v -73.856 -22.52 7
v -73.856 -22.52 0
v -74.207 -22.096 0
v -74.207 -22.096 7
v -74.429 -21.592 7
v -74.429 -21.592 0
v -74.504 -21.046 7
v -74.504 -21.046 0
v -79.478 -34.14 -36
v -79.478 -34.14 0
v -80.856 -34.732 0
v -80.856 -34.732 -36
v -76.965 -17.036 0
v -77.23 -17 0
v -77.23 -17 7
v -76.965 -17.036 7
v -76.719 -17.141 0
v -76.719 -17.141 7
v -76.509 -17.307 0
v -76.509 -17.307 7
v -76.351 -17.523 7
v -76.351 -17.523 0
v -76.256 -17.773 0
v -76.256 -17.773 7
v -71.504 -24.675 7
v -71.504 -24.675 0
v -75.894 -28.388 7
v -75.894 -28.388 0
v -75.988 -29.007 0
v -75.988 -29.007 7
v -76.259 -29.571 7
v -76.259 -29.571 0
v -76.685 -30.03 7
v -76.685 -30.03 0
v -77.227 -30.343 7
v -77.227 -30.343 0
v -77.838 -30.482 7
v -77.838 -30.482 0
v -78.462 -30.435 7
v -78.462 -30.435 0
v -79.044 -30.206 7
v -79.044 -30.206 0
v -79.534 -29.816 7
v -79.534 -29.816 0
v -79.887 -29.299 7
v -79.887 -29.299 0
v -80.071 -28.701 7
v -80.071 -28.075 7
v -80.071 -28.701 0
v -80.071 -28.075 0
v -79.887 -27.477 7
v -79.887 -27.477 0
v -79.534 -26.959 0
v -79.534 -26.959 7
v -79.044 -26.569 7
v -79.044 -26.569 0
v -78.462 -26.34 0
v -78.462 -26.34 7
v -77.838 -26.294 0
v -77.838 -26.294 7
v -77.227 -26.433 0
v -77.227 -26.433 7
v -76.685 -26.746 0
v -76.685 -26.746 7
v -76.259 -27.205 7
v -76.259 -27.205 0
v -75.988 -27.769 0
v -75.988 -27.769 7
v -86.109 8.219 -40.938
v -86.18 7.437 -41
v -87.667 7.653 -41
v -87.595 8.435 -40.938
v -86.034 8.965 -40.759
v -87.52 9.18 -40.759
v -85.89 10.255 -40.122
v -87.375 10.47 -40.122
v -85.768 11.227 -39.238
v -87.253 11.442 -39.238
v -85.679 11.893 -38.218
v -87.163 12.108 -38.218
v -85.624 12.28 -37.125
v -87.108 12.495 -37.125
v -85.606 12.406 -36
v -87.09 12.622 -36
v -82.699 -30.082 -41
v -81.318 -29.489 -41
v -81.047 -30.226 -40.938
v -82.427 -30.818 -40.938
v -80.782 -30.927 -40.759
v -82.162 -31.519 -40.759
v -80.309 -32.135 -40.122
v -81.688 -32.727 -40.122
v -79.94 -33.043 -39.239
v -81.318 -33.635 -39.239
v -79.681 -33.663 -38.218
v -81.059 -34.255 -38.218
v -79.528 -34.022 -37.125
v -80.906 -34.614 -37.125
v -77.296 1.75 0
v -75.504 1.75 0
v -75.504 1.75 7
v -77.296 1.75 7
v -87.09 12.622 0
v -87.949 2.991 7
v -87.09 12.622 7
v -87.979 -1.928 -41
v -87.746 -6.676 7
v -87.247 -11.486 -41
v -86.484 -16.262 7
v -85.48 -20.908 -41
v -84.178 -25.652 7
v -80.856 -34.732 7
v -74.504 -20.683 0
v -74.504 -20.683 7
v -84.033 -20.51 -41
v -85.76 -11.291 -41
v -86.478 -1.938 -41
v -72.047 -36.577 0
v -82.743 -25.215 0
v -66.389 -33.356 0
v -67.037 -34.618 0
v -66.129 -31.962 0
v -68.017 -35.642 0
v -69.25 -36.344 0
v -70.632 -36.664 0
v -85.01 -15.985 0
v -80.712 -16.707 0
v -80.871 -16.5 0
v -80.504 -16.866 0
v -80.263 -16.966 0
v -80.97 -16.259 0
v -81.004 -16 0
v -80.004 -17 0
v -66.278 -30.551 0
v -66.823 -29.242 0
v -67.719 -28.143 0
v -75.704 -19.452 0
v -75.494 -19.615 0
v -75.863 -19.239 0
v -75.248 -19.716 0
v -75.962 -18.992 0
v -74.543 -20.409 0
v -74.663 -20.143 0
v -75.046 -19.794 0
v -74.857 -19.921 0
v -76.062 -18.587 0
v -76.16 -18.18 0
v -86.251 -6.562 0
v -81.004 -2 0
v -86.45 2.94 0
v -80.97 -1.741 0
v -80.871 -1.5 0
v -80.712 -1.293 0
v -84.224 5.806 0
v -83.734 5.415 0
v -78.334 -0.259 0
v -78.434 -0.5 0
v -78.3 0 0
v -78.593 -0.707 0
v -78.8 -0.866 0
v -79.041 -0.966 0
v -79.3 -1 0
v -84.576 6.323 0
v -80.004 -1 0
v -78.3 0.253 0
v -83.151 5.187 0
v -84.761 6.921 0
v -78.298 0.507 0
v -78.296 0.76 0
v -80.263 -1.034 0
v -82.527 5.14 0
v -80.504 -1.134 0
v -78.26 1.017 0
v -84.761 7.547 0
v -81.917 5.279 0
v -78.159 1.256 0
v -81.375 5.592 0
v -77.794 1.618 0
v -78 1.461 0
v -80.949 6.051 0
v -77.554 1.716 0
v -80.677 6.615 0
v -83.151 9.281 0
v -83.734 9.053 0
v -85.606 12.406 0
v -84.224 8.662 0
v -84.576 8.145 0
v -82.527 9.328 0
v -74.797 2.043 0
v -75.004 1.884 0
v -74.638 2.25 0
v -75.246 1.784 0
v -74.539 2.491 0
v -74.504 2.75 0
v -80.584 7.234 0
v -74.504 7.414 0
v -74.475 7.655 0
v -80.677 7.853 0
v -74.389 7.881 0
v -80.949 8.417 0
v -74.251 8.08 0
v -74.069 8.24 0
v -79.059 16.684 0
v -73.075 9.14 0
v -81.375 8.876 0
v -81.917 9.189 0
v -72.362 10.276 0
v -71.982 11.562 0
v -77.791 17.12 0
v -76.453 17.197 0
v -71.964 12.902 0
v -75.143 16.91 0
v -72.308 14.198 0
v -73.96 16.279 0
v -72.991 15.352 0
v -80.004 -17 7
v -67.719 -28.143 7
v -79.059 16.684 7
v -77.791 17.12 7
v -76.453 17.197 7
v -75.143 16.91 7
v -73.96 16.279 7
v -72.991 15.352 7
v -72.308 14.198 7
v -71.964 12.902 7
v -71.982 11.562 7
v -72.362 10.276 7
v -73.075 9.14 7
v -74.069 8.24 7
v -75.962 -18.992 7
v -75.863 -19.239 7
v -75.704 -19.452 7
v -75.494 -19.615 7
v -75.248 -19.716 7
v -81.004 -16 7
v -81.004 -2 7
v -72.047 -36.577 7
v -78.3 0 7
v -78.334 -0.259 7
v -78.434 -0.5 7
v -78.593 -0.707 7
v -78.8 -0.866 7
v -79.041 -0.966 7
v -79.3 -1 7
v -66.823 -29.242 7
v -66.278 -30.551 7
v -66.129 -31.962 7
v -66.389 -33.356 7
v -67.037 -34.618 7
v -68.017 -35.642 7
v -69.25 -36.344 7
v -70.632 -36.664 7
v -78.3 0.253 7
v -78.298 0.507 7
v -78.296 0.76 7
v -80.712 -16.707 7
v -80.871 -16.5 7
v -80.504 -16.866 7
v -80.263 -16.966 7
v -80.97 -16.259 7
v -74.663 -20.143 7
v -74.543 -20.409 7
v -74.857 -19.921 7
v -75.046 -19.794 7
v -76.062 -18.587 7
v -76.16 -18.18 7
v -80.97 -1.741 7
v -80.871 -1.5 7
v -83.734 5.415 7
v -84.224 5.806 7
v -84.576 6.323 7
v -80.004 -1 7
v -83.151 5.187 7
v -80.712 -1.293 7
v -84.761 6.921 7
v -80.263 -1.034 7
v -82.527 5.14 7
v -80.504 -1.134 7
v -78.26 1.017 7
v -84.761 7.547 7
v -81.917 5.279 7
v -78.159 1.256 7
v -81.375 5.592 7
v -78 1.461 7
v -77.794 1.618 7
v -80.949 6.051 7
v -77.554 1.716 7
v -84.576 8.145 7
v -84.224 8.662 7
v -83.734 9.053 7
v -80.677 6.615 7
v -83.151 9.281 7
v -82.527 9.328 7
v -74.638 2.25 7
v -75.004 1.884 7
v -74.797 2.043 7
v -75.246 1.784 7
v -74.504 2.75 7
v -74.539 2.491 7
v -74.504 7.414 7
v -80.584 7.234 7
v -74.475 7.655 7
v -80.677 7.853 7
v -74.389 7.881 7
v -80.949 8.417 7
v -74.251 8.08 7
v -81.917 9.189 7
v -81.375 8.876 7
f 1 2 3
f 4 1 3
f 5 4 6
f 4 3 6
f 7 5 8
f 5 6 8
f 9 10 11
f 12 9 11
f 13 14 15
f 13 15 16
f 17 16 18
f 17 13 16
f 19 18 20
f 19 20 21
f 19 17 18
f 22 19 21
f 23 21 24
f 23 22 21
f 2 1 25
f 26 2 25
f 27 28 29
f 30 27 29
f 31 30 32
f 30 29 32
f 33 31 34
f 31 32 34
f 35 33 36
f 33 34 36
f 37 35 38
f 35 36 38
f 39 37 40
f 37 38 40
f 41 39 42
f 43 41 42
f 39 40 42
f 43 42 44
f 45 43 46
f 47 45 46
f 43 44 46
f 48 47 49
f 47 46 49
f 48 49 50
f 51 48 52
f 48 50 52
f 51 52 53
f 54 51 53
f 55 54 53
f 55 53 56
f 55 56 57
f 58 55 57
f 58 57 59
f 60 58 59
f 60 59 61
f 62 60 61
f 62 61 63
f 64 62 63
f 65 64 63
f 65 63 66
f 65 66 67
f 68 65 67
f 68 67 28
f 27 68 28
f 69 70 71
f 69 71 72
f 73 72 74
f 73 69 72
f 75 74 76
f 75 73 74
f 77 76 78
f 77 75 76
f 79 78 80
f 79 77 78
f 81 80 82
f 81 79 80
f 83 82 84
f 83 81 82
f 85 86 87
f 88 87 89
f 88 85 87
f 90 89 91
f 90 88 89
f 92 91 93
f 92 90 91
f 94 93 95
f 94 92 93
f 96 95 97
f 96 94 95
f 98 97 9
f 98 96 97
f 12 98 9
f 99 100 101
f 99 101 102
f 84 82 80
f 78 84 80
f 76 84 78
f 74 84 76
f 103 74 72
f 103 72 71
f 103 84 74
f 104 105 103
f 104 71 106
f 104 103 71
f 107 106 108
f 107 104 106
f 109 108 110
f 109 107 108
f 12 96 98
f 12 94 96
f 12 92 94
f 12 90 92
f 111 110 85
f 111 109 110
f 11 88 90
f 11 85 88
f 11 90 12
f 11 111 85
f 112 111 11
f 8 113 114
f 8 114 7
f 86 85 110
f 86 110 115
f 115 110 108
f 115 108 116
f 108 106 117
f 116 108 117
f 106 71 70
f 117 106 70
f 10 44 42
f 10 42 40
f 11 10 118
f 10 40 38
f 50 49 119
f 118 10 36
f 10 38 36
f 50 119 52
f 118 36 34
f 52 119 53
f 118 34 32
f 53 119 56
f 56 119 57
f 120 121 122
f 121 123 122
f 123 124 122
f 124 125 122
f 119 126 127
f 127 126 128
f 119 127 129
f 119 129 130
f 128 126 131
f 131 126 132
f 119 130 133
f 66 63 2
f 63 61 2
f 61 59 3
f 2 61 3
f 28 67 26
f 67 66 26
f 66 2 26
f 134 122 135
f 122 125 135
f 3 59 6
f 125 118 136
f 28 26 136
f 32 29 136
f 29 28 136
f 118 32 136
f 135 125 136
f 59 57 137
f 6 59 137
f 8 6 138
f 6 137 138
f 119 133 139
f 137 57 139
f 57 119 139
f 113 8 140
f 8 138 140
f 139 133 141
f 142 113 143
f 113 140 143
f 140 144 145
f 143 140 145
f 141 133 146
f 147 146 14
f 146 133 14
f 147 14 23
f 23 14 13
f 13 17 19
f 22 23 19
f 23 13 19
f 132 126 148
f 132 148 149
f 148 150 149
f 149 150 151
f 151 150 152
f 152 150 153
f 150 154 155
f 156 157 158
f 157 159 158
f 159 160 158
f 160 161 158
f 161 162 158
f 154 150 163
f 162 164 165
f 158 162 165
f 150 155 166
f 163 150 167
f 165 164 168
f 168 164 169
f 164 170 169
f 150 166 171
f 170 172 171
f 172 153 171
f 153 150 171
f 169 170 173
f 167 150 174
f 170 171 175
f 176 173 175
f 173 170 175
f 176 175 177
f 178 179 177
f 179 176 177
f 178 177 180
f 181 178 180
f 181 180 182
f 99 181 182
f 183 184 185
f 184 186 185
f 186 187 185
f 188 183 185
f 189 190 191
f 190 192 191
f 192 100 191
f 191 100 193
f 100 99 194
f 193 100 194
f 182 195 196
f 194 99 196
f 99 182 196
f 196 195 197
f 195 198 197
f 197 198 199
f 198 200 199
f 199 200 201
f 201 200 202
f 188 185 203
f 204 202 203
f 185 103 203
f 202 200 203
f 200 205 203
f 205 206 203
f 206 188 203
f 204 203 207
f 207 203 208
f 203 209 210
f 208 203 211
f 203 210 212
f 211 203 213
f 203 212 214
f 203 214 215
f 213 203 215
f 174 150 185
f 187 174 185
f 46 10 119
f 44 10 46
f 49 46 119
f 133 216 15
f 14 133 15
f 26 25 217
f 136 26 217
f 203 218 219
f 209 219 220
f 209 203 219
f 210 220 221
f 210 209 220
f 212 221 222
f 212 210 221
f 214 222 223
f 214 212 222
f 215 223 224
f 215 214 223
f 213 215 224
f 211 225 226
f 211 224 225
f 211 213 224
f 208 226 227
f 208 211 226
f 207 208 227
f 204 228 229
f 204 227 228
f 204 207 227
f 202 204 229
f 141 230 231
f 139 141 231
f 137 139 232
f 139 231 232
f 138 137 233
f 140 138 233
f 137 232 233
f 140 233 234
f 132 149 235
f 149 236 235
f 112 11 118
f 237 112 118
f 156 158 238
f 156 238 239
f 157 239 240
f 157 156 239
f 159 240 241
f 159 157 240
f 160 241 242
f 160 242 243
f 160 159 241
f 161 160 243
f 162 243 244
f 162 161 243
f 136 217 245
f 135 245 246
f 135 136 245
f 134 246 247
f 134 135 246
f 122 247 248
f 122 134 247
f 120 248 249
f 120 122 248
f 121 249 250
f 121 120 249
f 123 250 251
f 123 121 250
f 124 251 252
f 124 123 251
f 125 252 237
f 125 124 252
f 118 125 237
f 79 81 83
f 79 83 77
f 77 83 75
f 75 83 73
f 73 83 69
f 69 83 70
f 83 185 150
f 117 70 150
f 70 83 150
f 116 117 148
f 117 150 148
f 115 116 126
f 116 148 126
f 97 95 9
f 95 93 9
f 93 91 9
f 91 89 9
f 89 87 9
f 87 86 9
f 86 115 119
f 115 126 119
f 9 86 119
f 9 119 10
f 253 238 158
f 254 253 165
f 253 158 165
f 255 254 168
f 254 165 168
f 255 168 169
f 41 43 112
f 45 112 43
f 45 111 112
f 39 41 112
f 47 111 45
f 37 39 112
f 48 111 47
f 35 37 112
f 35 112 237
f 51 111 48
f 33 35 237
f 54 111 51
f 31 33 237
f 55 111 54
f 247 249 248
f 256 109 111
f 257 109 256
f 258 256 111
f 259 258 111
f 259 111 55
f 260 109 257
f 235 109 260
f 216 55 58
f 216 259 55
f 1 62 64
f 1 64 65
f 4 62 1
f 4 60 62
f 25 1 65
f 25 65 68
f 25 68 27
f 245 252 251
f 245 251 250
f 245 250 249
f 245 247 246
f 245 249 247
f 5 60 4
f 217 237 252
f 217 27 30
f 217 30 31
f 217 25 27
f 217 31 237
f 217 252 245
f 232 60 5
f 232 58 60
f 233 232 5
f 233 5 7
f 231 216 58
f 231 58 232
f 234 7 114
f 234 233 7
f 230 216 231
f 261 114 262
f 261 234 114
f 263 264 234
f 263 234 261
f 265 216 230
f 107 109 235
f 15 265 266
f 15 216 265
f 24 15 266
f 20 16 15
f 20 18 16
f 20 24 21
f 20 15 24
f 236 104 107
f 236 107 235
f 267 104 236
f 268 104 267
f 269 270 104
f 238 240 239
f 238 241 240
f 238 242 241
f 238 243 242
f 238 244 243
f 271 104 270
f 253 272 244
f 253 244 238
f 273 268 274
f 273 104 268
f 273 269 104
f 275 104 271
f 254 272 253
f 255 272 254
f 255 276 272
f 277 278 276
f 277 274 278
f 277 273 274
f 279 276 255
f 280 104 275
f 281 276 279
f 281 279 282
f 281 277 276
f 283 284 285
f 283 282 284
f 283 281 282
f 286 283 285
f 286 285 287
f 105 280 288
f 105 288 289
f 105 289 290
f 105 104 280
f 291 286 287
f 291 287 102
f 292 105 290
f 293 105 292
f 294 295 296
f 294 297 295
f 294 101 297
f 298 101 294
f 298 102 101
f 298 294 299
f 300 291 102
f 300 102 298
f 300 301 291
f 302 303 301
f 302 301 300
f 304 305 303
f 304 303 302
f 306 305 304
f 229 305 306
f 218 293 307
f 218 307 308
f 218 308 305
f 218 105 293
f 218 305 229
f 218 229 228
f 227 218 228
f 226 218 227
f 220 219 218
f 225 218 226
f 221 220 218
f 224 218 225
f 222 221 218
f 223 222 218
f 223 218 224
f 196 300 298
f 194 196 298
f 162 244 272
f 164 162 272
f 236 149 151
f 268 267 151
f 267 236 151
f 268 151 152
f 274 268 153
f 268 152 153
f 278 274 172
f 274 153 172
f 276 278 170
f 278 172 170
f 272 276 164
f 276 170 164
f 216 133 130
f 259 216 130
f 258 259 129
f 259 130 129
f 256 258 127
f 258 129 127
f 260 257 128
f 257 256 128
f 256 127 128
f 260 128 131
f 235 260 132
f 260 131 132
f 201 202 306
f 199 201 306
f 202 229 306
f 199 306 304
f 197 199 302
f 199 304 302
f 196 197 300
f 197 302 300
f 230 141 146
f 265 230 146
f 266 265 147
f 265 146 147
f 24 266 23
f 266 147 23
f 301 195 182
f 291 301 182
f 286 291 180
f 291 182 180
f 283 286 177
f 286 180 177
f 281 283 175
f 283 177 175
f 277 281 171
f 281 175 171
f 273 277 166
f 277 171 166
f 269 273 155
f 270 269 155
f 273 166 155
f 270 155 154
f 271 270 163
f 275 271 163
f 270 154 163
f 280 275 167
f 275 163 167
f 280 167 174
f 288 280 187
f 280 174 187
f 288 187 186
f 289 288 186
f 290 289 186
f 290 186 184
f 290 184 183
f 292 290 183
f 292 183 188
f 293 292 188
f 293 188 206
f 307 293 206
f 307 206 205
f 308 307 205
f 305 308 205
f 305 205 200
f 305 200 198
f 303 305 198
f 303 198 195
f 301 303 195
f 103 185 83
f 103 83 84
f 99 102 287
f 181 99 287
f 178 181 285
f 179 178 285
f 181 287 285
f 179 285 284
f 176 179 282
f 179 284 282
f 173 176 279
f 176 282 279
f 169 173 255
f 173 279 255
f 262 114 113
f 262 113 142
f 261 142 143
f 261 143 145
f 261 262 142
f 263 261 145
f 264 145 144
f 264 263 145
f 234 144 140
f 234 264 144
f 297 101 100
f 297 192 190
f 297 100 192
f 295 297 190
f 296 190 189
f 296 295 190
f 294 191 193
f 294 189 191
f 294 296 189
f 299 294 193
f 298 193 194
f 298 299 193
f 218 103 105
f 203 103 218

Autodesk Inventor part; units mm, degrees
ref_plane "YZ Plane" through (0, 0, 0) normal (1, 0, 0) x (0, 1, 0)
ref_plane "XZ Plane" through (0, 0, 0) normal (0, 1, 0) x (-1, 0, 0)
ref_plane "XY Plane" through (0, 0, 0) normal (0, 0, 1) x (1, 0, 0)
sketch "Skizze1" plane through (0, 0, 0) normal (0, 0, 1) x (1, 0, 0)
  circle A0 centre (0, 0) radius 88
  circle A1 centre (-82.6842, 7.2339) radius 2.1
  arc A2 (-78.002, 6.8243) -> (-73.5779, -26.7802) centre (0, 0) ccw
  circle A3 centre (-82.6842, 7.2339) radius 4.7
  circle A4 centre (-77.9945, -28.3877) radius 2.1
  circle A5 centre (-77.9945, -28.3877) radius 4.7
  circle A6 centre (0, 0) radius 78.3
  circle A7 centre (0, 0) radius 86.5
  arc A8 (-84.1729, 21.9984) -> (-86.4353, 9.8964) centre (0, 0) ccw
  line L0 (0, 0) -> (-82.0101, 11.8853)
  line L1 (-82.0101, 11.8853) -> (-87.0902, 12.6216)
  line L2 (0, 0) -> (-76.1395, -32.7061)
  line L3 (-76.1395, -32.7061) -> (-80.8559, -34.7321)
  line L4 (0, 0) -> (-82.828, 2.5361)
  line L5 (-82.828, 2.5361) -> (-87.9588, 2.6932)
  line L6 (0, 0) -> (-79.3493, -23.8872)
  line L7 (-79.3493, -23.8872) -> (-84.2646, -25.3669)
  line L8 (-78.3816, 80.7625) -> (-42.1157, 57.6586)
  line L9 (-42.1157, 57.6586) -> (-70.0553, 13.8022)
  line L10 (-70.0553, 13.8022) -> (-106.3212, 36.9061)
  line L11 (-106.3212, 36.9061) -> (-78.3816, 80.7625)
  line L12 (-56.0855, 35.7304) -> (-92.3514, 58.8343) construction
  line L13 (-64.096, -31.4636) -> (-25.7575, -66.5943)
  line L14 (-25.7575, -66.5943) -> (-54.8079, -98.2972)
  line L15 (-54.8079, -98.2972) -> (-93.1463, -63.1665)
  line L16 (-93.1463, -63.1665) -> (-64.096, -31.4636)
  line L17 (-47.7296, -52.0877) -> (-73.9771, -80.7319) construction
  arc A9 (-44.3621, 76) -> (44.3621, 76) centre (0, 0) ccw
  line L18 (13, 63) -> (-13, 63)
  line L19 (0, 63) -> (0, -88)
  line L20 (0, 0) -> (-56.0855, 35.7304) construction
  line L21 (0, 0) -> (-44.9267, -49.0289) construction
  line L22 (0, 0) -> (-88, 0)
  line L23 (0, 0) -> (-86.6631, 15.281) construction
  line L24 (0, 0) -> (-79.7551, -37.1904) construction
  circle A10 centre (0, 0) radius 83 construction
  line L25 (-63.2545, -17.7499) -> (-72.5045, -17.7499)
  arc A11 (-72.5045, -17.7499) -> (-74.5045, -19.7499) centre (-72.5045, -19.7499) ccw
  line L26 (-74.5045, -19.7499) -> (-74.5045, -21.0458)
  arc A12 (-74.5045, -21.0458) -> (-73.8556, -22.5204) centre (-72.5045, -21.0458) ccw
  line L27 (-73.8556, -22.5204) -> (-71.5045, -24.6748)
  line L28 (-71.5045, -24.6748) -> (-52.6253, -41.9744)
  arc A13 (-52.6253, -41.9744) -> (-51.2741, -42.4999) centre (-51.2741, -40.4999) ccw
  line L29 (-51.2741, -42.4999) -> (51.2741, -42.4999)
  arc A14 (51.2741, -42.4999) -> (52.6253, -41.9744) centre (51.2741, -40.4999) ccw
  line L30 (52.6253, -41.9744) -> (71.5045, -24.6748)
  line L31 (71.5045, -24.6748) -> (73.8557, -22.5204)
  arc A15 (73.8557, -22.5204) -> (74.5045, -21.0458) centre (72.5045, -21.0458) ccw
  line L32 (74.5045, -21.0458) -> (74.5045, -19.7499)
  arc A16 (74.5045, -19.7499) -> (72.5045, -17.7499) centre (72.5045, -19.7499) ccw
  line L33 (72.5045, -17.7499) -> (63.2545, -17.7499)
  arc A17 (61.2545, -15.7499) -> (63.2545, -17.7499) centre (63.2545, -15.7499) ccw
  line L34 (61.2545, -15.7499) -> (61.2545, -2.2499)
  arc A18 (63.2545, -0.2499) -> (61.2545, -2.2499) centre (63.2545, -2.2499) ccw
  line L35 (63.2545, -0.2499) -> (72.5045, -0.2499)
  arc A19 (72.5045, -0.2499) -> (74.5045, 1.7501) centre (72.5045, 1.7501) ccw
  line L36 (74.5045, 1.7501) -> (74.5045, 6.2357)
  arc A20 (74.5045, 6.2357) -> (74.1913, 7.3103) centre (72.5045, 6.2357) ccw
  line L37 (74.1913, 7.3103) -> (66.8685, 18.8046)
  line L38 (66.8685, 18.8046) -> (66.8312, 18.8625)
  line L39 (66.8312, 18.8625) -> (63.3633, 24.3061)
  line L40 (63.3633, 24.3061) -> (61.5013, 27.2292)
  arc A21 (61.5013, 27.2292) -> (61.4647, 27.2866) centre (58.5872, 25.413) ccw
  line L41 (61.4647, 27.2866) -> (59.6025, 30.21)
  line L42 (59.6025, 30.21) -> (59.5849, 30.2372)
  line L43 (59.5849, 30.2372) -> (52.3622, 41.5747)
  arc A22 (52.3622, 41.5747) -> (50.6754, 42.5001) centre (50.6754, 40.5001) ccw
  line L44 (50.6754, 42.5001) -> (34.4476, 42.5001)
  arc A23 (33.1728, 42.9591) -> (34.4476, 42.5001) centre (34.4477, 44.5002) ccw
  arc A24 (33.1728, 42.9591) -> (28.0733, 42.9591) centre (30.623, 39.877) ccw
  arc A25 (26.7984, 42.5001) -> (28.0733, 42.9591) centre (26.7984, 44.5002) ccw
  line L45 (26.7984, 42.5001) -> (-26.7984, 42.5001)
  arc A26 (-28.0733, 42.9591) -> (-26.7984, 42.5001) centre (-26.7984, 44.5002) ccw
  arc A27 (-28.0733, 42.9591) -> (-33.1728, 42.9591) centre (-30.623, 39.877) ccw
  arc A28 (-34.4476, 42.5001) -> (-33.1728, 42.9591) centre (-34.4477, 44.5002) ccw
  line L46 (-34.4476, 42.5001) -> (-50.6754, 42.5001)
  arc A29 (-50.6754, 42.5001) -> (-52.3622, 41.5747) centre (-50.6754, 40.5001) ccw
  line L47 (-52.3622, 41.5747) -> (-59.5849, 30.2372)
  line L48 (-59.5849, 30.2372) -> (-59.6025, 30.21)
  line L49 (-59.6025, 30.21) -> (-61.4647, 27.2866)
  arc A30 (-61.4647, 27.2866) -> (-61.5013, 27.2292) centre (-58.5191, 25.37) ccw
  line L50 (-61.5013, 27.2292) -> (-63.3633, 24.3061)
  line L51 (-63.3633, 24.3061) -> (-66.8312, 18.8625)
  line L52 (-66.8312, 18.8625) -> (-66.8685, 18.8046)
  line L53 (-66.8685, 18.8046) -> (-74.1912, 7.3103)
  arc A31 (-74.1912, 7.3103) -> (-74.5045, 6.2357) centre (-72.5045, 6.2357) ccw
  line L54 (-74.5045, 6.2357) -> (-74.5045, 1.7501)
  arc A32 (-74.5045, 1.7501) -> (-72.5045, -0.2499) centre (-72.5045, 1.7501) ccw
  line L55 (-72.5045, -0.2499) -> (-63.2545, -0.2499)
  arc A33 (-61.2545, -2.2499) -> (-63.2545, -0.2499) centre (-63.2545, -2.2499) ccw
  line L56 (-61.2545, -2.2499) -> (-61.2545, -15.7499)
  arc A34 (-63.2545, -17.7499) -> (-61.2545, -15.7499) centre (-63.2545, -15.7499) ccw
  line L57 (-82.6842, 7.2339) -> (-80.4481, 20.4232)
  circle A35 centre (-76.8409, 12.298) radius 4.9146
  circle A36 centre (-76.8409, 12.298) radius 4
  line L58 (-74.5045, 1.7501) -> (-78.2804, 1.7501)
  line L59 (-74.5045, -19.7499) -> (-75.7683, -19.7499)
  line L60 (-87.0902, 12.6216) -> (-79.059, 16.6835)
  line L61 (-77.9945, -28.3877) -> (-72.421, -40.5488)
  circle A37 centre (-71.0396, -31.7667) radius 4.9146
  circle A38 centre (-71.0396, -31.7667) radius 4
  line L62 (-80.8559, -34.7321) -> (-72.0471, -36.577)
  line L63 (-74.5045, 6.2357) -> (-74.5045, 10.7976)
  line L64 (-77.9945, -28.3877) -> (-73.2945, -28.3877)
  line L65 (-73.2945, -28.3877) -> (-73.2945, -31.484)
  line L66 (-73.2945, -28.3877) -> (-73.2945, -23.0346)
  point P0 (0, 0)
  point P1 (-85.6057, 12.4064)
  point P2 (-79.4777, -34.1401)
  point P3 (0, 0)
  point P4 (-74.9054, -43.26)
  point P5 (-83.5496, 22.399)
  point P6 (-86.1005, 12.4781)
  point P7 (-86.4122, 10.096)
  point P8 (-71.9434, -30.9037)
  point P9 (-77.4904, 11.2303)
  point P10 (-72.696, 9.6574)
  point P11 (-67.7194, -28.1432)
  point P12 (-67.103, -28.8245)
  point P13 (-74.5045, 7.9743)
  dimension "d0" = 9.4
  dimension "d1" = 173
  dimension "d8" = 52
  dimension "d9" = 43
  dimension "d10" = 43
  dimension "d11" = 52
  dimension "d12" = 66.5
  dimension "d13" = 90
  dimension "d14" = 90
  dimension "d15" = 90
  dimension "d16" = 90
  dimension "d17" = 90
  dimension "d18" = 90
  dimension "d19" = 90
  dimension "d20" = 66.5
  dimension "d21" = 26
  dimension "d22" = 47.5
  dimension "d23" = 32.5
  dimension "d139" = 10
  dimension "d140" = 25
  dimension "d156" = 8
  dimension "d157" = 8
extrude "Extrusion1" add sketch "Skizze1" against normal blind 41 contours A0 L7 A7 A5 L3 | L1 A8 A3 A7 L5 A0 | A0 L22 A7 L7 | L5 A7 L22 A0 | L1 A7 A3 A8 | A5 A7 | A3 A7
extrude "Extrusion2" add sketch "Skizze1" along normal blind 7 contours A0 L7 A7 A5 L3 | L3 A7 L62 | L1 A8 A3 A7 L5 A0 | L60 A8 L1 | A0 L22 A7 L7 | L3 A5 L61 L62 A7 | A7 A5 L3 | L5 A7 L22 A0 | L1 A7 A3 A8 | A8 L60 A7 L1 | L60 L57 A3 L1 A7 | L7 A5 A7 | A7 L22 A2 L6 L7 | A7 A5 A37 L64 A4 L61 | A5 A7 | L61 A37 L62 | A37 L2 A38 A6 | A6 A38 L2 A37 | L54 L58 A2 L4 | L4 A2 A6 A35 L63 L54 | A12 L27 L66 A37 A6 A2 L6 | L6 A2 L59 L26 A12 | L5 L4 A2 L22 A7 | A7 A3 L5 | A3 A7 | L1 A3 A7 | L60 A35 L57 | A35 L0 A36 A6 | A6 A36 L0 A35 | L6 A2 A5 | L61 A4 L64 A37 A5 | A5 A37 L2 | L2 A37 L61 | A38 L2 A6 | A6 L2 A38 | A35 L63 A36 L0 | L2 A38 A6 L66 A37 | A37 L66 L27 L28 | L4 A3 A2 | A7 A3 A35 | A35 L0 L57 | A36 L0 A6 | A6 L0 A36 | A6 A37 A5 | A37 L64 A5 A38 | A5 A38 L2 A37 | L2 L65 A38 A6 | A6 A38 L2 | A38 A5 L65 L2 | A36 L63 L0 | A35 A6 A36 L63 | L66 A6 A37 | A3 A35 A6 | L0 A35 A3 | L0 A36 A3 A35 | L0 L63 A36 A6 | A6 A36 A3 L0 | A37 A6 L66 A5 | A5 L64 A37 | A38 A5 | A38 A5 L66 A6 | A35 A3 A36 A6 | A3 A36 A35 | A3 A36
sketch "Skizze7" plane through (0, 0, 7) normal (0, 0, 1) x (1, 0, 0)
  arc A0 (-75.2406, -20.5635) -> (-69.3003, -22.9246) centre (-71.3821, -19.509) ccw
  arc A1 (-77.999, 0.3892) -> (-75.2406, -20.5635) centre (0, 0) ccw
  arc A2 (-72.8723, 4.2072) -> (-77.999, 0.3892) centre (-73.9991, 0.3692) ccw
  arc A3 (-72.8723, 4.2072) -> (-61.6214, 8.4293) centre (-70.0553, 13.8022) ccw
  arc A4 (-73.0131, 3.7275) -> (-61.1997, 8.1606) centre (-70.0553, 13.8022) ccw
  arc A5 (-73.0131, 3.7275) -> (-77.499, 0.3867) centre (-73.9991, 0.3692) ccw
  arc A6 (-77.499, 0.3867) -> (-74.7582, -20.4317) centre (0, 0) ccw
  arc A7 (-74.7582, -20.4317) -> (-69.5605, -22.4976) centre (-71.3821, -19.509) ccw
  arc A8 (-57.0023, -23.7222) -> (-69.5605, -22.4976) centre (-64.096, -31.4636) ccw
  line L0 (-81.0045, -17) -> (-62.0045, -17)
  line L1 (-62.0045, -17) -> (-62.0045, -1)
  line L2 (-62.0045, -1) -> (-81.0045, -1)
  line L3 (-81.0045, -1) -> (-81.0045, -17)
  line L4 (-81.0045, -17) -> (-62.0045, -1) construction
  line L5 (-62.0045, -17) -> (-81.0045, -1) construction
  arc A9 (-75.2406, -20.5635) -> (-69.3003, -22.9246) centre (-71.3821, -19.509) ccw
  arc A10 (-77.999, 0.3892) -> (-75.2406, -20.5635) centre (0, 0) ccw
  arc A11 (-72.8723, 4.2072) -> (-77.999, 0.3892) centre (-73.9991, 0.3692) ccw
  arc A12 (-72.8723, 4.2072) -> (-61.6214, 8.4293) centre (-70.0553, 13.8022) ccw
  arc A13 (-73.0131, 3.7275) -> (-61.1997, 8.1606) centre (-70.0553, 13.8022) ccw
  arc A14 (-73.0131, 3.7275) -> (-77.499, 0.3867) centre (-73.9991, 0.3692) ccw
  arc A15 (-77.499, 0.3867) -> (-74.7582, -20.4317) centre (0, 0) ccw
  arc A16 (-74.7582, -20.4317) -> (-69.5605, -22.4976) centre (-71.3821, -19.509) ccw
  arc A17 (-57.0023, -23.7222) -> (-69.5605, -22.4976) centre (-64.096, -31.4636) ccw
  line L6 (0, 0) -> (-88, 0) construction
  line L7 (0, 0) -> (-70.4769, -25.6515) construction
  line L8 (0, 0) -> (-74.7146, 6.5367) construction
  circle A18 centre (-74.7146, 6.5367) radius 3
  line L9 (-74.7146, 6.5367) -> (-74.7146, -9.8771) construction
  line L10 (-78.7146, 6.5367) -> (-78.7146, -9.8771)
  line L11 (-70.7146, -9.8771) -> (-70.7146, 6.5367)
  arc A19 (-78.7146, -9.8771) -> (-70.7146, -9.8771) centre (-74.7146, -9.8771) ccw
  line L12 (-70.4769, -25.6515) -> (-70.4769, -13.0481) construction
  line L13 (-66.4769, -25.6515) -> (-66.4769, -13.0481)
  line L14 (-74.4769, -13.0481) -> (-74.4769, -25.6515)
  arc A20 (-66.4769, -13.0481) -> (-74.4769, -13.0481) centre (-70.4769, -13.0481) ccw
  point P0 (83.6944, 461.4718)
  point P1 (50.4138, 461.4718)
  point P2 (51.6944, 461.4718)
  point P3 (82.4138, 461.4718)
  point P4 (225.0044, 602.8331)
  point P5 (191.7237, 602.8331)
  point P6 (193.0044, 602.8331)
  point P7 (223.7237, 602.8331)
  point P8 (363.5869, 628.2091)
  point P9 (357.6097, 628.732)
  point P10 (362.0169, 595.2563)
  point P11 (367.655, 597.3084)
  point P12 (406.3129, 669.9339)
  point P13 (410.3051, 673.6839)
  point P14 (281.6601, 684.5107)
  point P15 (276.0219, 682.4586)
  point P16 (276.7768, 680.2764)
  point P17 (229.3797, 602.3331)
  point P18 (240.8641, 609.8331)
  point P19 (280.2544, 653.8611)
  point P20 (280.0901, 651.5579)
  point P21 (286.0672, 651.035)
  point P22 (286.3631, 657.444)
  point P23 (283.6046, 678.3966)
  point P24 (208.3641, 735.8331)
  point P25 (208.3641, 713.8331)
  point P26 (208.3641, 669.8331)
  point P27 (208.3641, 666.8331)
  point P28 (208.3641, 602.3331)
  point P29 (-74.7146, -1.6702)
  point P30 (-70.4769, -19.3498)
  point P31 (-61.892, 765.0568)
  point P32 (-53.892, 765.0568)
  point P33 (-66.1297, 787.0568)
  point P34 (-58.1297, 787.0568)
  point P35 (280.1559, 614.5868)
  point P36 (280.8975, 610.8357)
  point P37 (282.7456, 598.5868)
  dimension "d88" = 19
  dimension "d89" = 16
  dimension "d106" = 8
  dimension "d107" = 8
extrude "Extrusion6" cut sketch "Skizze7" against normal blind 41 contours L0 L3 L2 L10 A19 A1 | A1 A19 A6 L0 | A19 L10 L2 A1 | A1 L2 A6 A19 | A6 A19 L14 L0 | L14 A19 L11 A20 L13 L0 | A6 L2 L11 A20 L14 A19 | L13 A20 L11 L2 L1 L0 | L14 A20 L11 A19
fillet "Rundung2" radius 1 9 edges at (-81.0045, -17, 3.5) (-81.0045, -1, 3.5) (-78.2936, -1, 3.5) (-78.2804, 1.7501, 3.5) (-74.5045, 1.7501, 3.5) (-76.4323, -17, 3.5) (-75.7683, -19.7499, 3.5) (-74.5045, -19.7499, 3.5) (-74.5045, 7.9743, 3.5)
fillet "Rundung3" radius 5 2 edges at (-86.3479, 12.514, -41) (-80.1668, -34.4361, -41)
equation "\"d10\" = d9"
equation "\"d11\" = d8"
properties part number "Abdeckung"
